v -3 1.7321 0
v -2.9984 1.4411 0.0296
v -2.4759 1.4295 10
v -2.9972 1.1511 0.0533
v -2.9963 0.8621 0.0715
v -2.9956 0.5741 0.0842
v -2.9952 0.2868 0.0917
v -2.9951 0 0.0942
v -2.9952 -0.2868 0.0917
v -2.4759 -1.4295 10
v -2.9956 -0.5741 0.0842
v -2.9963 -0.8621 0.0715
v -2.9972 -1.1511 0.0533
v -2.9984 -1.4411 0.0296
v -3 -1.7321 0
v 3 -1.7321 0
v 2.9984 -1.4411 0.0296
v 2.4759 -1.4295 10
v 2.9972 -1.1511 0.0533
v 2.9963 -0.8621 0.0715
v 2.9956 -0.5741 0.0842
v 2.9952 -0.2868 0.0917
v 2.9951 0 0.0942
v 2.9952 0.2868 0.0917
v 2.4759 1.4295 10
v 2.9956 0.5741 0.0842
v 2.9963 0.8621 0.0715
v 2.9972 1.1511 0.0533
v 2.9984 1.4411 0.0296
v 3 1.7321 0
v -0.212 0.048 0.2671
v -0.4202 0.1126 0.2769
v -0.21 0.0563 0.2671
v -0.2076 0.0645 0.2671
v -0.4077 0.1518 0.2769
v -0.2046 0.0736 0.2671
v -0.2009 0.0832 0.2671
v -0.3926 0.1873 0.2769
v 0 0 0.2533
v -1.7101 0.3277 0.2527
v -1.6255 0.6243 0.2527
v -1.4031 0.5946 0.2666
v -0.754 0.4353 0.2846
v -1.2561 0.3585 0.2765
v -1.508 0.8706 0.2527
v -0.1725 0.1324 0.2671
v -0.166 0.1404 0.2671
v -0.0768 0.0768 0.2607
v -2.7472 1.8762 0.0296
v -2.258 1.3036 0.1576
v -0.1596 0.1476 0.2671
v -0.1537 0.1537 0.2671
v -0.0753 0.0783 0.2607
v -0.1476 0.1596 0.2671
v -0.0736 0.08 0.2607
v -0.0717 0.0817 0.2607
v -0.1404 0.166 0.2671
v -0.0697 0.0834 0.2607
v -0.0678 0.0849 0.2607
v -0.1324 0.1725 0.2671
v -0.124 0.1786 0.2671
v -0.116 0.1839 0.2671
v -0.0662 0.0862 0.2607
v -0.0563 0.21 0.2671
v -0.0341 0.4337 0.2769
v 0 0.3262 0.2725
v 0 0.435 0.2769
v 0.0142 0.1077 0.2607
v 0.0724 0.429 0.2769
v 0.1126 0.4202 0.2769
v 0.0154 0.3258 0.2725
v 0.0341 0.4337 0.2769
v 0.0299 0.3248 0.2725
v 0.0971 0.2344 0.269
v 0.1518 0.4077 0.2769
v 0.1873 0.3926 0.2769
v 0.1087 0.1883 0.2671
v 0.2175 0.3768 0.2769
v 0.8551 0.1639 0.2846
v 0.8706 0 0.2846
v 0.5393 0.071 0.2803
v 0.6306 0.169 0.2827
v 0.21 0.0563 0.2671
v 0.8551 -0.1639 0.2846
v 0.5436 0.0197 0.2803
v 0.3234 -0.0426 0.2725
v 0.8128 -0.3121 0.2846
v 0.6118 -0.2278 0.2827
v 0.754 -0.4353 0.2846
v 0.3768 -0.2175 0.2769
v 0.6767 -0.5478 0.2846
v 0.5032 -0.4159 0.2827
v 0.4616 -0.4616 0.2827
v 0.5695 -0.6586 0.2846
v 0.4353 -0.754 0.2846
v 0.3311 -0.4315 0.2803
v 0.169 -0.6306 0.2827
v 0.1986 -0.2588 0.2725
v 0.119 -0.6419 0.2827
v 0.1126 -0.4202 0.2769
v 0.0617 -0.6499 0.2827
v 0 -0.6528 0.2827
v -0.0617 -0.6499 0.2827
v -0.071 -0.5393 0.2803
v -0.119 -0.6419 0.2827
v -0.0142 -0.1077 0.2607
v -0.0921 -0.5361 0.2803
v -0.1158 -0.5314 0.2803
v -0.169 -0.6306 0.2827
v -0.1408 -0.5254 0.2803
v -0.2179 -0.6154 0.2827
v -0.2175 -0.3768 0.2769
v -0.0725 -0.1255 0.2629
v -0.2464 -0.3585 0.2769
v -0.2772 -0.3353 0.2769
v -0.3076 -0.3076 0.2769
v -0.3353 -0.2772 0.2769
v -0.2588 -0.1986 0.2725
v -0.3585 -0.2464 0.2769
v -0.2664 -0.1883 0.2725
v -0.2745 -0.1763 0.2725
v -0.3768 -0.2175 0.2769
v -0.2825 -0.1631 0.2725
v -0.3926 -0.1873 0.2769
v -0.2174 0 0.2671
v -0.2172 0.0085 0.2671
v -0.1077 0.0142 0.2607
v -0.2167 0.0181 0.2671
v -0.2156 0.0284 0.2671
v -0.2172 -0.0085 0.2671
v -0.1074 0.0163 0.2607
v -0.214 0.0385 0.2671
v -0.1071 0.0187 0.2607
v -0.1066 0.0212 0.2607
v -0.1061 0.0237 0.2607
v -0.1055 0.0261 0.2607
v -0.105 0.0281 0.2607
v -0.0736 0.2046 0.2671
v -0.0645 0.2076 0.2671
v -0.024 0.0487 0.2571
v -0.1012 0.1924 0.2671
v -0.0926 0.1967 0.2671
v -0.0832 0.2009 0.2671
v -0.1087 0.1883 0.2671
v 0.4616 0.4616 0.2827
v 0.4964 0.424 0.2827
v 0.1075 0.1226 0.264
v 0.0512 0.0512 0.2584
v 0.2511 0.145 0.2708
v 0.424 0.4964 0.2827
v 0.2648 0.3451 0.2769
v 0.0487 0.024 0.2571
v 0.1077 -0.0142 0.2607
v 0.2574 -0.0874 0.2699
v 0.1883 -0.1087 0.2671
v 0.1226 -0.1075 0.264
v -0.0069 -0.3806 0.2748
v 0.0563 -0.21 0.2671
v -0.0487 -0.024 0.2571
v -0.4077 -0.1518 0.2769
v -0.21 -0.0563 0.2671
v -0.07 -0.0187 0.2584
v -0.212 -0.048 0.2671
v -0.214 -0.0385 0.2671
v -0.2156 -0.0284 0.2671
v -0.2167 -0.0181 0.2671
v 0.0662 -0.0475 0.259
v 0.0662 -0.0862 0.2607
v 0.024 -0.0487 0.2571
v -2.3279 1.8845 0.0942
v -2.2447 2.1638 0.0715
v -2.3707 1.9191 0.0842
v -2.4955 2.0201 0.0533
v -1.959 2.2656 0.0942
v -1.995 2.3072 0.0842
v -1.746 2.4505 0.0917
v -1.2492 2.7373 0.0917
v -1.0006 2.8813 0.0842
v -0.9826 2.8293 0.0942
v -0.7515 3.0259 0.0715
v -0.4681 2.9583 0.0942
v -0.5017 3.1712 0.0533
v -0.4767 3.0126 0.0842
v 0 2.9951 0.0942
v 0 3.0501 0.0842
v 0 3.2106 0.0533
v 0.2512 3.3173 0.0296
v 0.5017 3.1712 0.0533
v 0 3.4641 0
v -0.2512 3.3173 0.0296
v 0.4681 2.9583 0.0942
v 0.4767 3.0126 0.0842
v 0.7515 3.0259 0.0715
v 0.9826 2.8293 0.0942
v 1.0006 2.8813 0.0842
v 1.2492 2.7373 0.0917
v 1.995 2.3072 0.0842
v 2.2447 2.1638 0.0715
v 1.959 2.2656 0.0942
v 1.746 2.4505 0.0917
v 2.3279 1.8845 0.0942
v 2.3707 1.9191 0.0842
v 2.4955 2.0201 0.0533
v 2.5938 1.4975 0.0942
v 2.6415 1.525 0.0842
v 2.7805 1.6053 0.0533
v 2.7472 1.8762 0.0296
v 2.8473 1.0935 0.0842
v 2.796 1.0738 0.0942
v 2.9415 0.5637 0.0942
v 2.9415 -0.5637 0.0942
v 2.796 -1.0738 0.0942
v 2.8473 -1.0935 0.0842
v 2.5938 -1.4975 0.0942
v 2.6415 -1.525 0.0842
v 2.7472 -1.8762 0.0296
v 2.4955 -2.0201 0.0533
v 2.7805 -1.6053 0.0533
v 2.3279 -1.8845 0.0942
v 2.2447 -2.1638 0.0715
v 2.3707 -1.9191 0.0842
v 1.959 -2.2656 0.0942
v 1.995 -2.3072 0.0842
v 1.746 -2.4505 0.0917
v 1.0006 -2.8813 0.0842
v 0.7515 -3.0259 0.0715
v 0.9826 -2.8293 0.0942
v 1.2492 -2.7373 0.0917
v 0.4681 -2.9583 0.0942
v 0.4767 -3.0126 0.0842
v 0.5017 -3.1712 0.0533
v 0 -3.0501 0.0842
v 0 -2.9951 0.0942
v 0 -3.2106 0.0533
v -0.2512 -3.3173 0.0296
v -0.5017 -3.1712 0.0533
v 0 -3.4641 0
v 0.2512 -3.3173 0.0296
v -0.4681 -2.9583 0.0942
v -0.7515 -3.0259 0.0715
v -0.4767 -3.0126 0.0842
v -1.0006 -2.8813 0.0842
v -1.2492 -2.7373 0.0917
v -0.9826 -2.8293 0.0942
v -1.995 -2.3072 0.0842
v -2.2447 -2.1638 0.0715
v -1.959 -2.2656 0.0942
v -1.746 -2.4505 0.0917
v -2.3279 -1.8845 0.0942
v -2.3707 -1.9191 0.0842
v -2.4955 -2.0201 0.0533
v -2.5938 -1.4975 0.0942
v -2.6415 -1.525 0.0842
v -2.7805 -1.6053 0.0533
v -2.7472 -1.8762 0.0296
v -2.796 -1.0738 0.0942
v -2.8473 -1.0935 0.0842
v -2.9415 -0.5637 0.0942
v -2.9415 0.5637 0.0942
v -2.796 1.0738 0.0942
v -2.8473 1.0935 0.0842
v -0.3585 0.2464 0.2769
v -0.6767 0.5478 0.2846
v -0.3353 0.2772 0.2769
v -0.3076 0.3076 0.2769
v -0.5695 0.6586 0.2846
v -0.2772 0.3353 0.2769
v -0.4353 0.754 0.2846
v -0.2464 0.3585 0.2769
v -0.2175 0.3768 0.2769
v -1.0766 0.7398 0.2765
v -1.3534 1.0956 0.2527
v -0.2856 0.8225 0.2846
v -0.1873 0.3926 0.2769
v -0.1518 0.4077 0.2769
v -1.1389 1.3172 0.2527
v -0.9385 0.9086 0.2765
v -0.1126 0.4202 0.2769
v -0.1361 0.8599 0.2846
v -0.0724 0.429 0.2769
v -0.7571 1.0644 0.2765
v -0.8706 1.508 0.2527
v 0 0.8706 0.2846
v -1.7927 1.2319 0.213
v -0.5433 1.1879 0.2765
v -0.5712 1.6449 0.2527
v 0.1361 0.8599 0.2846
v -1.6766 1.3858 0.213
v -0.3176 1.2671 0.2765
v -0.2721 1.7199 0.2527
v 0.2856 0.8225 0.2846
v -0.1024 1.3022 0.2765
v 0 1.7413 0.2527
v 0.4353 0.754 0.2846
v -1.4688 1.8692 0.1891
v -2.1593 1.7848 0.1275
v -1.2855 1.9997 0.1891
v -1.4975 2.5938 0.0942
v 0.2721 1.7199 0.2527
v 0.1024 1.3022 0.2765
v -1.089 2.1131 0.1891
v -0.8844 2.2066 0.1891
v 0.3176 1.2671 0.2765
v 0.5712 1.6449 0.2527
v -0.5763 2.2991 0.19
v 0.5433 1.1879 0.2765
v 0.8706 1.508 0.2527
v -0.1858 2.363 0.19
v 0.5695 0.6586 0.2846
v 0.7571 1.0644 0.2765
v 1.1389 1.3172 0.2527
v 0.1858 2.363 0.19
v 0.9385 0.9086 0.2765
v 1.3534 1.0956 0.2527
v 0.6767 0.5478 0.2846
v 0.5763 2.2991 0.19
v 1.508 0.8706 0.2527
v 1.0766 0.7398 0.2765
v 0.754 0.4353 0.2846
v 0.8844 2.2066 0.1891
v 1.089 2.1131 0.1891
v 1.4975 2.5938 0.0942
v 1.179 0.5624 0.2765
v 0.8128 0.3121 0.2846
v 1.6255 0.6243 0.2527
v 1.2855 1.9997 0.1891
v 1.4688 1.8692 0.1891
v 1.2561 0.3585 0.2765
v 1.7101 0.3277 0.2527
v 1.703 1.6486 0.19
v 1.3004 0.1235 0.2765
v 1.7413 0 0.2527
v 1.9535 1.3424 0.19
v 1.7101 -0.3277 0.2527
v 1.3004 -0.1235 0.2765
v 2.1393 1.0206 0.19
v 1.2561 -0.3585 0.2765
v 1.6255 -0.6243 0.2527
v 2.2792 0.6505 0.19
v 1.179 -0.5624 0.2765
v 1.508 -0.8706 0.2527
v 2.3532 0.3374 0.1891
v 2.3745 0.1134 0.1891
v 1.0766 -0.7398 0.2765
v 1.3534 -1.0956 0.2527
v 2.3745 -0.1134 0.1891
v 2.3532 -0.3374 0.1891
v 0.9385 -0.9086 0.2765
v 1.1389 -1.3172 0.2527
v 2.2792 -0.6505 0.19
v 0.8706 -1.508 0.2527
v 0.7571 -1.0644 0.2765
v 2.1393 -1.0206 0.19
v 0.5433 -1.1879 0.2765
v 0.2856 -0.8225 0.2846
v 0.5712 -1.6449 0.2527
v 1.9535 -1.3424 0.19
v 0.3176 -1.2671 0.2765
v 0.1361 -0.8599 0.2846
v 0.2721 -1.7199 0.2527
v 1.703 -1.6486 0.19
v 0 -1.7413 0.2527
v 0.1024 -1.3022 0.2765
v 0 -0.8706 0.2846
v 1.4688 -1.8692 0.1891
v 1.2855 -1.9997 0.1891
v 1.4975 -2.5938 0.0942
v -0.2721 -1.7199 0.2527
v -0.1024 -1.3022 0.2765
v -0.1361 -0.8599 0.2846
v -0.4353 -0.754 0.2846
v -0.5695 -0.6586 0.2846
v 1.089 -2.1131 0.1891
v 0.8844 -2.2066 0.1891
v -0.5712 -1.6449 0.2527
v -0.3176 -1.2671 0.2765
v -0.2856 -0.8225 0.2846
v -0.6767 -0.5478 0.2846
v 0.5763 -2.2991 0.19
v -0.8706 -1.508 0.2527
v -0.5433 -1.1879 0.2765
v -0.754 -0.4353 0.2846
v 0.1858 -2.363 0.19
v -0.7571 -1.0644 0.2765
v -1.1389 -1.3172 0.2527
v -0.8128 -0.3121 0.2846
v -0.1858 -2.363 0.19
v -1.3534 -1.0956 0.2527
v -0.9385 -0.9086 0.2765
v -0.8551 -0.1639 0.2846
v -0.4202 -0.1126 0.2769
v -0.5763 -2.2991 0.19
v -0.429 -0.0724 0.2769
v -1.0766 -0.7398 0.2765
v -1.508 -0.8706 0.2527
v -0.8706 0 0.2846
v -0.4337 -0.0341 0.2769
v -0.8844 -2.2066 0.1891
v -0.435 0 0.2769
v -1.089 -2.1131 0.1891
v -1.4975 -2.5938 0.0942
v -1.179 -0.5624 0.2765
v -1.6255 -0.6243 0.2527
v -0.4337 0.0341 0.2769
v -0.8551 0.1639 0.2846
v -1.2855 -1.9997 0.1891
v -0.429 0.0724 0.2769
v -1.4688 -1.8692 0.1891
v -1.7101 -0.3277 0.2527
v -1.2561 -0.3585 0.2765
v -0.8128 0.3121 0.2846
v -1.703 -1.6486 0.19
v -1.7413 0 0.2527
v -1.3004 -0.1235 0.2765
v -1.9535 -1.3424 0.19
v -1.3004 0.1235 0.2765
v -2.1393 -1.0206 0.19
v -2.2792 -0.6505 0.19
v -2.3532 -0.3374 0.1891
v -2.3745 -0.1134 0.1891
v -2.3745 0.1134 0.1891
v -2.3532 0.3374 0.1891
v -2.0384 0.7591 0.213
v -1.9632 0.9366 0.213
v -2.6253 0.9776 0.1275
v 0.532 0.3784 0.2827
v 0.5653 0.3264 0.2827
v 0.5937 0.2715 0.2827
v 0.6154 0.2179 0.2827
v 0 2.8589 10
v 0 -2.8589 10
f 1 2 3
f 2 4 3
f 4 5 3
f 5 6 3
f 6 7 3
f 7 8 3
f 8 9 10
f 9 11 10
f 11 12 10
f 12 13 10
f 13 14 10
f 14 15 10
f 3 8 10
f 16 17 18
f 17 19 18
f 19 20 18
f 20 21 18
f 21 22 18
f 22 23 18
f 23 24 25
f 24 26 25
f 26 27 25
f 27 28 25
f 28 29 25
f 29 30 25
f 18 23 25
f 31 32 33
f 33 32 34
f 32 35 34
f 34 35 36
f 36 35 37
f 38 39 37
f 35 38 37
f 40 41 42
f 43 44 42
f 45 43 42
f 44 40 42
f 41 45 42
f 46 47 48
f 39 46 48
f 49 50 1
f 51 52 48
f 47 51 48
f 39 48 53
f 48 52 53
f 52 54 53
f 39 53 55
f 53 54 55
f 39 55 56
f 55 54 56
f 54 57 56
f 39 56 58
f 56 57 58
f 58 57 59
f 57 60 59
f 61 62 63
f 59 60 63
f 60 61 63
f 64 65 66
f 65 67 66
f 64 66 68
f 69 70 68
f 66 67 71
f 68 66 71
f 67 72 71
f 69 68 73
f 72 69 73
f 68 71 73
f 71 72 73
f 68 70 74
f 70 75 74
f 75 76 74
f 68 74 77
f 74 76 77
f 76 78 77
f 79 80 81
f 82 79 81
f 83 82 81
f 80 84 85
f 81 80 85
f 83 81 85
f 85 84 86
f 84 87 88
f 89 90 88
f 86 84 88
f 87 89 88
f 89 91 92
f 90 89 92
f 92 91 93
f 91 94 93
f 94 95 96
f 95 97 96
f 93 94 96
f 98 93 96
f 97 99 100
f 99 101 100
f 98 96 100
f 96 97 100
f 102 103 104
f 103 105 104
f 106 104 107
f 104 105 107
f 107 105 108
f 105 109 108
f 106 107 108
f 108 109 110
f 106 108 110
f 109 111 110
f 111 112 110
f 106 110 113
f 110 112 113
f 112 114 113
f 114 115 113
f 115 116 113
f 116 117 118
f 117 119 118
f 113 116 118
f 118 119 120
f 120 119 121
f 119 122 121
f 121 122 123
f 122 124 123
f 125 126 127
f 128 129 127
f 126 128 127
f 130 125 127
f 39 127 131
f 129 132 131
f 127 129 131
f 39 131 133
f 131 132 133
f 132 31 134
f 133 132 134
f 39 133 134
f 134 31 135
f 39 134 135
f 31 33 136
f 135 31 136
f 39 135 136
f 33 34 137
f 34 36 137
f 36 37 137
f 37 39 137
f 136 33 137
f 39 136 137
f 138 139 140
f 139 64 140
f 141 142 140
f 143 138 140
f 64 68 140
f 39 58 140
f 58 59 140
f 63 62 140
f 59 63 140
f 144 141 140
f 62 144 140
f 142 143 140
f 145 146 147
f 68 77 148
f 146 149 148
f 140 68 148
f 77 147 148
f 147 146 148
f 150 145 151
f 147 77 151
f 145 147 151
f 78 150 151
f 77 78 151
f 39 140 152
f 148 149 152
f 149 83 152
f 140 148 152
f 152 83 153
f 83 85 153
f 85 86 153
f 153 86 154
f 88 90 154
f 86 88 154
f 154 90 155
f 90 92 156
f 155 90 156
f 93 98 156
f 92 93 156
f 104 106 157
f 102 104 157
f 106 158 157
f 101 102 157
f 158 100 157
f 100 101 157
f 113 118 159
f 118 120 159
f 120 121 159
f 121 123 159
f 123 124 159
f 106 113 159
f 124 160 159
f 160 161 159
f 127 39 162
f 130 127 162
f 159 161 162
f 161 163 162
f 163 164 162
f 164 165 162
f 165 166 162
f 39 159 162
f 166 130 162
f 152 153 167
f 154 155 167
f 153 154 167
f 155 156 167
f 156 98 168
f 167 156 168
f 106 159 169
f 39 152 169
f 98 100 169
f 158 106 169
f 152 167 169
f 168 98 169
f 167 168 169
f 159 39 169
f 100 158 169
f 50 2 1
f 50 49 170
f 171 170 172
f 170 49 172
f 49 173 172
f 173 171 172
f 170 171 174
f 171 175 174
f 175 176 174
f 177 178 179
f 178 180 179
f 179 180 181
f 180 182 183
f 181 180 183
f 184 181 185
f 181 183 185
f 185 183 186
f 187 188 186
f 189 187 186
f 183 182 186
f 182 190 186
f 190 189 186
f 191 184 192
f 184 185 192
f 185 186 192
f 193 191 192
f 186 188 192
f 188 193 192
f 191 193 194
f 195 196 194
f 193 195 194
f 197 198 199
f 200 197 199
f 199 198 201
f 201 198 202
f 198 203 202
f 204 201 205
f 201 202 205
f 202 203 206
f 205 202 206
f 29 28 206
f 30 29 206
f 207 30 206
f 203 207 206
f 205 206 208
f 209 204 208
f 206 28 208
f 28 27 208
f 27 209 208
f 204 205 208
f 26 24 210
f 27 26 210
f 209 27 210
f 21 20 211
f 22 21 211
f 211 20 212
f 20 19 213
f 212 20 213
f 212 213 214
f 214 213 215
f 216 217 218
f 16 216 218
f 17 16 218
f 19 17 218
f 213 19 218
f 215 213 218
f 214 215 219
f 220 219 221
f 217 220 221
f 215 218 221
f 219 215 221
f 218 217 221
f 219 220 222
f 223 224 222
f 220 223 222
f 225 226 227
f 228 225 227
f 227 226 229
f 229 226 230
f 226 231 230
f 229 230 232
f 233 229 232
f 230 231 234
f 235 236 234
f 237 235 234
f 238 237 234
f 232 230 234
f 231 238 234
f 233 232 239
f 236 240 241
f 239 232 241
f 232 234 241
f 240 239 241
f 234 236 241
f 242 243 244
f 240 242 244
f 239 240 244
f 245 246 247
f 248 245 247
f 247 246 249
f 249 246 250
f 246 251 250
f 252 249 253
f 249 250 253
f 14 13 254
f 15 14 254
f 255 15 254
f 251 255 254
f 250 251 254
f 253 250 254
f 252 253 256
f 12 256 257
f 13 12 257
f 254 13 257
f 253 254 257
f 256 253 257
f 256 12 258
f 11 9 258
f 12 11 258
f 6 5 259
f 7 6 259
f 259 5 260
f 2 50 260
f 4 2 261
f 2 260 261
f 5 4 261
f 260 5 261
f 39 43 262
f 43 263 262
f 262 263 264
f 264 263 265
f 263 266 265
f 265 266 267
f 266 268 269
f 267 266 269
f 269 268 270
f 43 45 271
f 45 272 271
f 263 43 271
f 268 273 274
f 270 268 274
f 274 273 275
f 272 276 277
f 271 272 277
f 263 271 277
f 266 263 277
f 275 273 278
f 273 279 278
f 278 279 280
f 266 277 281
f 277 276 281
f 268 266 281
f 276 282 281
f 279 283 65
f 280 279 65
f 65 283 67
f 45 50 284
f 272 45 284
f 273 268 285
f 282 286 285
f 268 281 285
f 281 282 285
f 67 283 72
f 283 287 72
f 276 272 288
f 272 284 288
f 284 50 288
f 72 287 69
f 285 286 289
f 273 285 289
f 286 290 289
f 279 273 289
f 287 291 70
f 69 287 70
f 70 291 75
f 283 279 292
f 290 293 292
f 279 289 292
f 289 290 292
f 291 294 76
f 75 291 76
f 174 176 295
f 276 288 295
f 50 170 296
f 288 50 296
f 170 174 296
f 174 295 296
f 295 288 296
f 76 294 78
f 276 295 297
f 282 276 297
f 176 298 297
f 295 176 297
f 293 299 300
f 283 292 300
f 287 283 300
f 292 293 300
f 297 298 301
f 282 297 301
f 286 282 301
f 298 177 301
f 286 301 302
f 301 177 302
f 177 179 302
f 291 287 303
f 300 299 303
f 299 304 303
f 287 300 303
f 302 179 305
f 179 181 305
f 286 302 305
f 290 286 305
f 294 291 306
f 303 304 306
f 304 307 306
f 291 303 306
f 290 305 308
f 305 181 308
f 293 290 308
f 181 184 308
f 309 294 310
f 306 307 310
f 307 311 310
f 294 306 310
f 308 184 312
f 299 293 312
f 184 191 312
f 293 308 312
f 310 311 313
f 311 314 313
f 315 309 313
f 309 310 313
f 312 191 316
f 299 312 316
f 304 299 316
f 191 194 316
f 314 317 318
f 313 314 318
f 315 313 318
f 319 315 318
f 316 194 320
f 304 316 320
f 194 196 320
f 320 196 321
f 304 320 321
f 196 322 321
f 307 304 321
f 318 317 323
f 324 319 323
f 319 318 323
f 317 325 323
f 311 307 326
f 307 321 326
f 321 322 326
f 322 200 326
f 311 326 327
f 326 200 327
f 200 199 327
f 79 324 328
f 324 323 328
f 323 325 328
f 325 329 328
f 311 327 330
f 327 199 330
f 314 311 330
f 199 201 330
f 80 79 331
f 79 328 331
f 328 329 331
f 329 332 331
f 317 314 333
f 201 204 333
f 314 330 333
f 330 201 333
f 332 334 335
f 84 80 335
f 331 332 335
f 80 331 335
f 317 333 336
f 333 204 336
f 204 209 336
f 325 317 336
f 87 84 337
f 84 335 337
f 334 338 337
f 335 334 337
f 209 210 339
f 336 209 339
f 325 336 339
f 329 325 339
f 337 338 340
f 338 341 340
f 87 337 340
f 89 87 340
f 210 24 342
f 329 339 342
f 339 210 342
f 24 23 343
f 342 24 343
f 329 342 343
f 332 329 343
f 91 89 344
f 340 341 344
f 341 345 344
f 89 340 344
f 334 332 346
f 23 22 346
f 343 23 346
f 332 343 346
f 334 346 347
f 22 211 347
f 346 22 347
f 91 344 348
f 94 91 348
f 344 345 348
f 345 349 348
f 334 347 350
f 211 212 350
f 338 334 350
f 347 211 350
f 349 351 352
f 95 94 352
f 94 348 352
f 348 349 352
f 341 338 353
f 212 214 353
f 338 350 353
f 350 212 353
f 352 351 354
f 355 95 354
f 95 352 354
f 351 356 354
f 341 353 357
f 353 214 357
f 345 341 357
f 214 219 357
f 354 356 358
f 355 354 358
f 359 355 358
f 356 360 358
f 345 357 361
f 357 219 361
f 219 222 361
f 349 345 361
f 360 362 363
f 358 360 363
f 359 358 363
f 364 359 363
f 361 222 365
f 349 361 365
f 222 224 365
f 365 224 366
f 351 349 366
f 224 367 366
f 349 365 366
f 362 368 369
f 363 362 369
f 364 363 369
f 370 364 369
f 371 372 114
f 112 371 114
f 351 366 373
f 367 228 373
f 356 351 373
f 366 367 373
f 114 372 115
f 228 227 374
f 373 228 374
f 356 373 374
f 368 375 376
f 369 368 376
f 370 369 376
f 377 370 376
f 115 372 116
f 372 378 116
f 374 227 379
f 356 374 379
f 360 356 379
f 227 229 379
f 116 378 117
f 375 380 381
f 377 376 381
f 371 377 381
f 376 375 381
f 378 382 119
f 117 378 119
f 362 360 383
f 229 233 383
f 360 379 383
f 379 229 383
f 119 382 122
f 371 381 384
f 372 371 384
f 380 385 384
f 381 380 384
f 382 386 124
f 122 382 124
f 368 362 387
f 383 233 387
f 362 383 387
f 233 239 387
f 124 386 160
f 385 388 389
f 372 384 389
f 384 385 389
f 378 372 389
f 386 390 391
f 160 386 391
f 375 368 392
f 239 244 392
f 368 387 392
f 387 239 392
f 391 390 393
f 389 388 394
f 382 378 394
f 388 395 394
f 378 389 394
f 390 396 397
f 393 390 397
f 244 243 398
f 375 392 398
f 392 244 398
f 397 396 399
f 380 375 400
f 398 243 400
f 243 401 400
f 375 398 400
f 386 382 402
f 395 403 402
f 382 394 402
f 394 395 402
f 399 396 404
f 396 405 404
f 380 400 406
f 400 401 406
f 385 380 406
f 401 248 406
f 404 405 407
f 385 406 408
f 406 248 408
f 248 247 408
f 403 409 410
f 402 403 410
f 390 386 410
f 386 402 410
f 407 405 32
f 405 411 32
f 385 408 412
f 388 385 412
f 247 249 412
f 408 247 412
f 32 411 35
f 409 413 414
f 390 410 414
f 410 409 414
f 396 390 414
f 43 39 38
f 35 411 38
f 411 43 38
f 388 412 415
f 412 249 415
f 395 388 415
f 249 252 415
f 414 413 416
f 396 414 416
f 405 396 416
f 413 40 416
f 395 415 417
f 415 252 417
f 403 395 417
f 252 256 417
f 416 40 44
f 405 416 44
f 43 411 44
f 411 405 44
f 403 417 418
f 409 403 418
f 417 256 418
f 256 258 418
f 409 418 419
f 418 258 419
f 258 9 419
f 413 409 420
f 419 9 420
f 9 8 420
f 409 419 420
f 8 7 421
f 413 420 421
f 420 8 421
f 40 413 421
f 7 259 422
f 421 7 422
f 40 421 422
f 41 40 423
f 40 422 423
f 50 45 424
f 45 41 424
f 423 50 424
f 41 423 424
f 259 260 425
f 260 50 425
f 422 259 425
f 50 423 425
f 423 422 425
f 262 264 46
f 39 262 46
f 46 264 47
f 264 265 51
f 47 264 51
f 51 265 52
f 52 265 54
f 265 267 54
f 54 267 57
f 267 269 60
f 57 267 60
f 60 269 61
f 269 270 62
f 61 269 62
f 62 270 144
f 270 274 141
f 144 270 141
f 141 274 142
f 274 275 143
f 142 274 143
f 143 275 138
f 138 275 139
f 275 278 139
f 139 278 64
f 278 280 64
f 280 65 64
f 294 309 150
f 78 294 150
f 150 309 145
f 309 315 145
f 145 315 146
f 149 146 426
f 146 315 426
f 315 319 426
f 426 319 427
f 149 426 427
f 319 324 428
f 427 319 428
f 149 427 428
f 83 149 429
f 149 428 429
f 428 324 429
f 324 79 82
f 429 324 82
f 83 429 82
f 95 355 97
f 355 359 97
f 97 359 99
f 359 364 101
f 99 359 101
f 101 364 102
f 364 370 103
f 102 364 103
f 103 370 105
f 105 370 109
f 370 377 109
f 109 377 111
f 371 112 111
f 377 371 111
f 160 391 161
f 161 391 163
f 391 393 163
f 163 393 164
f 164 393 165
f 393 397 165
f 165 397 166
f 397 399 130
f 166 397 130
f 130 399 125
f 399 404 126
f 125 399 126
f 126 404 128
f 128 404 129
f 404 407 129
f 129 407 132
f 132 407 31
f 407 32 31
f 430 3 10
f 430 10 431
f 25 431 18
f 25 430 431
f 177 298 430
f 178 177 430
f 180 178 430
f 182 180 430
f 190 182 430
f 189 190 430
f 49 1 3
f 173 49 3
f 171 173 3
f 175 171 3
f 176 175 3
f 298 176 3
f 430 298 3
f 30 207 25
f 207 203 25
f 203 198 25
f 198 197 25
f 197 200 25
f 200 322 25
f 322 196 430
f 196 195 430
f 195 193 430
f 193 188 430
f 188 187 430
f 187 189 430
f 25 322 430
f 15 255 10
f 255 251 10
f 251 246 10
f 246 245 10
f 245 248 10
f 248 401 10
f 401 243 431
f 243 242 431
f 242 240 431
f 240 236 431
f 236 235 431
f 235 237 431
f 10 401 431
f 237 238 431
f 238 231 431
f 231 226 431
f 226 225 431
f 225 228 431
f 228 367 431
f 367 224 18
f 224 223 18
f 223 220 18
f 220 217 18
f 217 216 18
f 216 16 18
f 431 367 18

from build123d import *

# Parameters (mm, degrees)
F1_DEPTH = 10
F1_TAPER = 3


with BuildPart() as f1:
    # F0 (on Top) → F1 (new body)
    with BuildSketch(Plane.XY):
        Polygon((3, -1.7320508076), (3, 1.7320508076), (0, 3.4641016151), (-3, 1.7320508076), (-3, -1.7320508076), (0, -3.4641016151), align=None)
    extrude(amount=F1_DEPTH, taper=F1_TAPER)


with BuildPart() as f4:
    # F3 (on 3pt) → F4 (revolve)
    with BuildSketch(Plane(origin=(0, 0, 0), x_dir=(0.8660254038, -0.5, 0), z_dir=(-0.5, -0.8660254038, 0))):
        with BuildLine():
            Line((0, 0), (0, 0.2533346897))
            ThreePointArc((0, 0.2533346897), (-1.7412651517, 0.2526643975), (-3.4641016151, 0))
            Line((-3.4641016151, 0), (0, 0))
        make_face()
    revolve(axis=Axis((0, 0, 0.1266673449), (0, 0, -1)))


with BuildPart() as f1_1:
    add(f1.part)

    # F5: cut F4
    add(f4.part, mode=Mode.SUBTRACT)


solid = f1_1.part
